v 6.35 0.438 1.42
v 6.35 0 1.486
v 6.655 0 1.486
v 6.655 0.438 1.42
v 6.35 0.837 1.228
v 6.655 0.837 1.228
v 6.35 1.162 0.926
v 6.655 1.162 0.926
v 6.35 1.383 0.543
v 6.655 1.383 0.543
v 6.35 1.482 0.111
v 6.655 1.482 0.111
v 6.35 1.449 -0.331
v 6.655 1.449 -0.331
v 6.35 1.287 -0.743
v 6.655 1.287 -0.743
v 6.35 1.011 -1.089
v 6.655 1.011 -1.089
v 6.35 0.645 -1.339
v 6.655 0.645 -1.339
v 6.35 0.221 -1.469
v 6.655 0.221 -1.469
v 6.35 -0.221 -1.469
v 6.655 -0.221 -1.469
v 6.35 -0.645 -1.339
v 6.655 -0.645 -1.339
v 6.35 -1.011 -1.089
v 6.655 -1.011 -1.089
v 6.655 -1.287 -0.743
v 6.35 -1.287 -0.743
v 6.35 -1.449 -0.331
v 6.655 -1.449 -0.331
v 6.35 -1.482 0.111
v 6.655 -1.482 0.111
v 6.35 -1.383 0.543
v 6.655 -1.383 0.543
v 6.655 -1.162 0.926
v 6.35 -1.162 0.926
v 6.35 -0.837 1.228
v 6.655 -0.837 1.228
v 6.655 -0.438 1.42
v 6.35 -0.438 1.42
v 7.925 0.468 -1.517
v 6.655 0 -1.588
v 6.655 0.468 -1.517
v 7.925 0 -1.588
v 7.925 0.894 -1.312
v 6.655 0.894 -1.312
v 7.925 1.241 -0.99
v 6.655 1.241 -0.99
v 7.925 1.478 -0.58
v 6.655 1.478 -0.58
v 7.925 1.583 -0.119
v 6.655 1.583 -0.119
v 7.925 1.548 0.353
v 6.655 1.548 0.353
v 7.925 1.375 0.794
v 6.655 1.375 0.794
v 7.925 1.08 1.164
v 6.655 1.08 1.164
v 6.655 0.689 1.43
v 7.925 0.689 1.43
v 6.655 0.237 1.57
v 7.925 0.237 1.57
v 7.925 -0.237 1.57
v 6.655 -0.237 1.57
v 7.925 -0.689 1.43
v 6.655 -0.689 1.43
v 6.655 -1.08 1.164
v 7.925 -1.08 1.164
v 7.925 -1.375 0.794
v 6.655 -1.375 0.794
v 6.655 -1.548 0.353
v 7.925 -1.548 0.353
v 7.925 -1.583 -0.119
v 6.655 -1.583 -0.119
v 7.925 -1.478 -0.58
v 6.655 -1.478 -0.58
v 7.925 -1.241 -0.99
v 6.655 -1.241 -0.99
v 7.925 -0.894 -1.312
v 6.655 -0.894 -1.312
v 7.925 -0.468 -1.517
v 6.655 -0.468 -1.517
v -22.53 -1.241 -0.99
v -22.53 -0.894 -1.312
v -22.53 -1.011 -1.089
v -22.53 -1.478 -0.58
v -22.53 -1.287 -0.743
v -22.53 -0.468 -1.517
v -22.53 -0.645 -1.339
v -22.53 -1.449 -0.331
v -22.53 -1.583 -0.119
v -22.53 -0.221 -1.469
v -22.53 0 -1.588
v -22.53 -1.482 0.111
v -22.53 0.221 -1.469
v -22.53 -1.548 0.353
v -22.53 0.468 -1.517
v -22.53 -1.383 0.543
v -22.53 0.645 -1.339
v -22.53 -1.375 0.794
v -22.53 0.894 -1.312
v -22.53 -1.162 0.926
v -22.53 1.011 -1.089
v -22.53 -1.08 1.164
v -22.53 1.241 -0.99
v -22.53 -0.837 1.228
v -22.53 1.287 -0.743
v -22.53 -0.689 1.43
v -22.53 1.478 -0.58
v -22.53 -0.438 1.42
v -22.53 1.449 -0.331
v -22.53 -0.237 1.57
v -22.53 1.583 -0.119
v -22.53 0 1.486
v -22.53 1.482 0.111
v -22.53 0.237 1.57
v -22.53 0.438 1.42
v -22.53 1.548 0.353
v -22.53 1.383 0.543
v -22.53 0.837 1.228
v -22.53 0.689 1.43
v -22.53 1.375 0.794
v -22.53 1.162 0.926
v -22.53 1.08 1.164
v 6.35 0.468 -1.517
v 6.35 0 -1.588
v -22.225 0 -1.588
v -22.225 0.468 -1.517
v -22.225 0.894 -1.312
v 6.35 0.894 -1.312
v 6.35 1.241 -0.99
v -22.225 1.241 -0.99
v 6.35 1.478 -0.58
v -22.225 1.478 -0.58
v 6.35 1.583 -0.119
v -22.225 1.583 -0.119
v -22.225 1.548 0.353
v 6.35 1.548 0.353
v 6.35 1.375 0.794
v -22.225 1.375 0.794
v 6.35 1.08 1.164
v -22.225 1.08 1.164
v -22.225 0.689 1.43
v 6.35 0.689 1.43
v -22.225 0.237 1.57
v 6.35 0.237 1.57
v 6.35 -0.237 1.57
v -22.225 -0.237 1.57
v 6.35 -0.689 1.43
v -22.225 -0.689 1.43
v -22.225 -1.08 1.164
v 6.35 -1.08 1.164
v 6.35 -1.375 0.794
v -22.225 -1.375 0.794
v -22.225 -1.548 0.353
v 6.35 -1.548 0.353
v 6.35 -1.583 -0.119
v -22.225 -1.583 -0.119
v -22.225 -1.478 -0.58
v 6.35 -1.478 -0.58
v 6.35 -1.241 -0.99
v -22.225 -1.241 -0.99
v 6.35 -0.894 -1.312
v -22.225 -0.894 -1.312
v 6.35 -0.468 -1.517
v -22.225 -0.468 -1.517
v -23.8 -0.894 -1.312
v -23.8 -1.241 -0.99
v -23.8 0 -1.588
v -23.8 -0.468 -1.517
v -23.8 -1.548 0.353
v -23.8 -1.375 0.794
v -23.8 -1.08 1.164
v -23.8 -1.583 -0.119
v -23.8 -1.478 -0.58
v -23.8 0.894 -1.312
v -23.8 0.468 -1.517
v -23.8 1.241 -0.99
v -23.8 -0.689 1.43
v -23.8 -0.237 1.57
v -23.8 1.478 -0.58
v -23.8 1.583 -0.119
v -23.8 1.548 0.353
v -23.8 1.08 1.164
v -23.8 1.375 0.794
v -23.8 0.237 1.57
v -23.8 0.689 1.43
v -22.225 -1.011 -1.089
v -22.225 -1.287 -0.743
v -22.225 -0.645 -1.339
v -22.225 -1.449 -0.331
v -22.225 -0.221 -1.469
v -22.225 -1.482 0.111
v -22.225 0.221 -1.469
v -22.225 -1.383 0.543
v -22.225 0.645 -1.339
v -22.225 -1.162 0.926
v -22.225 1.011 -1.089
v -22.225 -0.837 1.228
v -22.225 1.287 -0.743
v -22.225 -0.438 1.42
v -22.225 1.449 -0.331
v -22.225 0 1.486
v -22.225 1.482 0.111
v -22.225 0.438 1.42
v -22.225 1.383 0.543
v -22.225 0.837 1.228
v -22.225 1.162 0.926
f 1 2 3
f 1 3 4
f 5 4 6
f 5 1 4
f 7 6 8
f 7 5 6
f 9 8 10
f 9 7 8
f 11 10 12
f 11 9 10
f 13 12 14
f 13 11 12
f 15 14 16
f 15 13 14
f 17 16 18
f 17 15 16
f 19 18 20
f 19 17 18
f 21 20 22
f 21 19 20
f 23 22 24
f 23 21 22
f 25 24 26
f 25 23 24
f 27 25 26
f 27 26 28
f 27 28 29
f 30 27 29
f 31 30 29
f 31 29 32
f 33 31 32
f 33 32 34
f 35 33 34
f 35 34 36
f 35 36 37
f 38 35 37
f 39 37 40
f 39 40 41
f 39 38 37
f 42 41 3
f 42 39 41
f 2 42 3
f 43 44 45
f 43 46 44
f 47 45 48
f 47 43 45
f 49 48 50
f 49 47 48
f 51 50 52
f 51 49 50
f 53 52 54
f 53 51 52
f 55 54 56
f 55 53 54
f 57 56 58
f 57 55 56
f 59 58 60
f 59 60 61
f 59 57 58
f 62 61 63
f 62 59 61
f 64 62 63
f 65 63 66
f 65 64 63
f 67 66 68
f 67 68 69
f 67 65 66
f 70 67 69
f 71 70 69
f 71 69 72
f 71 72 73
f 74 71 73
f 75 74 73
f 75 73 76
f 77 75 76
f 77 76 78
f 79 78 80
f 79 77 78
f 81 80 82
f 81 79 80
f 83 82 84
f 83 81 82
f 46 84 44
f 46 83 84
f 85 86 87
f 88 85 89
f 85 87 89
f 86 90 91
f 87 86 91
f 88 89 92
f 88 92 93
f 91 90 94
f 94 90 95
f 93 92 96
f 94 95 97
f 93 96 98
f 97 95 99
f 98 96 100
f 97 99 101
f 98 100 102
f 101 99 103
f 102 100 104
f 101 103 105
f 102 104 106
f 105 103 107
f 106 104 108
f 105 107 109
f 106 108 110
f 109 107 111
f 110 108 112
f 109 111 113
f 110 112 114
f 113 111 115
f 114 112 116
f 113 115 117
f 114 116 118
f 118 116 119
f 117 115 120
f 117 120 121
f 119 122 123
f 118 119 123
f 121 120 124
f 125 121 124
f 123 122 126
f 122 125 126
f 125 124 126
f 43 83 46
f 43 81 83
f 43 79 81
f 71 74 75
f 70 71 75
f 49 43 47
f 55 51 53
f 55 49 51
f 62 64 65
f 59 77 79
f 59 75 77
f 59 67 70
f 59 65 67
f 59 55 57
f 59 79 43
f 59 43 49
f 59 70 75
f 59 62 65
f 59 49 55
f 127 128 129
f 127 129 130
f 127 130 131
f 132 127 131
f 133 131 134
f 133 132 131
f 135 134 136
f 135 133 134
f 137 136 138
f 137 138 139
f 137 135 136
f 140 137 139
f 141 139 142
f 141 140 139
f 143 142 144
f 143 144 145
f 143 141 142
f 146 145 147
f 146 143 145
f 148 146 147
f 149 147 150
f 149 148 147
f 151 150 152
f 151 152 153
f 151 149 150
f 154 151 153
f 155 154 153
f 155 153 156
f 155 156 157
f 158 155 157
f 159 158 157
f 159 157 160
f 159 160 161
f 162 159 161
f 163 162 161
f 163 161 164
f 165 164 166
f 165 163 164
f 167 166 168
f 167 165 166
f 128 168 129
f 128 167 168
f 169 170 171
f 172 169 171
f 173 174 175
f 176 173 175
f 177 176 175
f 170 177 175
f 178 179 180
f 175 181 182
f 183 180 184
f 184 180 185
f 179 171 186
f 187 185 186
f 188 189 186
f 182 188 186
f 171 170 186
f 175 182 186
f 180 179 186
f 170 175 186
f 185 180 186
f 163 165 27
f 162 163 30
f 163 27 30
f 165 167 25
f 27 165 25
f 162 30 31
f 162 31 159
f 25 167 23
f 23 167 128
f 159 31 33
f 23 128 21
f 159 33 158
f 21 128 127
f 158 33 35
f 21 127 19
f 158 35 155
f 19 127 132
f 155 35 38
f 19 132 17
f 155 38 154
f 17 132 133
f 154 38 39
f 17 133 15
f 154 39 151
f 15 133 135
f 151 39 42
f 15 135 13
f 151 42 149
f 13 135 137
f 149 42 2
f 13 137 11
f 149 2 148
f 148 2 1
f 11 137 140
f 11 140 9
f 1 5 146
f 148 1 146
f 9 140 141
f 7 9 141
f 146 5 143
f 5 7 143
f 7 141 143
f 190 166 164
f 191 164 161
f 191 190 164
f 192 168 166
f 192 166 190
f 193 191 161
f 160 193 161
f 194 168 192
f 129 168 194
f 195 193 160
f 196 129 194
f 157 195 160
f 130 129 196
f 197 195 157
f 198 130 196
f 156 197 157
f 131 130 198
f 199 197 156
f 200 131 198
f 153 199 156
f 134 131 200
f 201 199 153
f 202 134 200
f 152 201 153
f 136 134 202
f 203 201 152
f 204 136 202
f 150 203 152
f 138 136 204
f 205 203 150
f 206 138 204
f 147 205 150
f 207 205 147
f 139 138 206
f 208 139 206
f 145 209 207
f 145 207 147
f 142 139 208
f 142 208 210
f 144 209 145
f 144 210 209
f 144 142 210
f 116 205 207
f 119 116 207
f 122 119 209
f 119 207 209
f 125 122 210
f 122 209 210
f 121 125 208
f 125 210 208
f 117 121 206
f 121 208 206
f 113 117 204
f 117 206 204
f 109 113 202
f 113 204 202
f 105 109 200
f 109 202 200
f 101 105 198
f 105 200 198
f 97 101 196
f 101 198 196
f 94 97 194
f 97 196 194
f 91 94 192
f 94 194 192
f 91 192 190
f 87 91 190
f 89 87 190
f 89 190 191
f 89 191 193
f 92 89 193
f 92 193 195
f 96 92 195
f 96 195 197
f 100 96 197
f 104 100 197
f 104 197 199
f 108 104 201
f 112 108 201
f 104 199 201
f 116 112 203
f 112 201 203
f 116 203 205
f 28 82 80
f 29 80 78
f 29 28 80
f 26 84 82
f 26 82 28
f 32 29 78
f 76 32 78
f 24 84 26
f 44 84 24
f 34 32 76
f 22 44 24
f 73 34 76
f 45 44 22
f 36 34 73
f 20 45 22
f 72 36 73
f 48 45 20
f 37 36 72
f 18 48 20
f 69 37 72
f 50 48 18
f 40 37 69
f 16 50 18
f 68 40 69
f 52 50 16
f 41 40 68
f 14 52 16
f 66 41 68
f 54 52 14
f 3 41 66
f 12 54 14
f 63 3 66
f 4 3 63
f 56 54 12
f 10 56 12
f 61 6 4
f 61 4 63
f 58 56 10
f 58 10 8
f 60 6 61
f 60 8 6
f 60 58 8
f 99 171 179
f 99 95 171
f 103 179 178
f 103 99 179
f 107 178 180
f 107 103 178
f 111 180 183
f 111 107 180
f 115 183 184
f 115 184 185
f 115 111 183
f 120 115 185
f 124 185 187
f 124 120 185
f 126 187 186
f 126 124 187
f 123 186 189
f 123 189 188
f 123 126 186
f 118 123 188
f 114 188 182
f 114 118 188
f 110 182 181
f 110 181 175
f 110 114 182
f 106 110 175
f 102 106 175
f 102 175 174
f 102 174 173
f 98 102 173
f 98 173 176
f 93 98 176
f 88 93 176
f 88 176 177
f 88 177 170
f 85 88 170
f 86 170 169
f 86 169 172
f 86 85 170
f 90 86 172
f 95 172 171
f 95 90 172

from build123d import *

# Parameters (mm, degrees)
SKETCH2_R               = 1.5875
EXTRUDE1_DEPTH          = 25.4
EXTRUDE1_DEPTH_BACK     = 25.4
CHAMFER1_SIZE           = 0.3175
SKETCH3_OUTSIDE_W       = 15.376
SKETCH3_OUTSIDE_H       = 15.376
SKETCH3_OUTSIDE_R       = 1.4859
CUT_EXTRUDE1_DEPTH      = 0.3048
SKETCH4_OUTSIDE_W       = 15.376
SKETCH4_OUTSIDE_H       = 15.376
SKETCH4_OUTSIDE_R       = 1.4859
CUT_EXTRUDE2_DEPTH      = 0.3048
SKETCH5_W               = 17.4752
SKETCH5_H               = 6.35
SKETCH5_W_2             = 1.6002
CUT_EXTRUDE3_DEPTH      = 2.5875
CUT_EXTRUDE3_DEPTH_BACK = 2.5875


with BuildPart() as part:
    # Sketch2 → Extrude1 (new body, two sides)
    with BuildSketch(Plane(origin=(0, 0, 0), x_dir=(0, 0, -1), z_dir=(1, 0, 0))) as extrude1_sk:
        Circle(SKETCH2_R)
    extrude(amount=EXTRUDE1_DEPTH)
    extrude(extrude1_sk.sketch, amount=-EXTRUDE1_DEPTH_BACK)

    # Chamfer1
    chamfer1_edges = [part.edges().sort_by_distance(p)[0] for p in [
        (-25.4, 0, 1.5875),
        (25.4, 0, 1.5875),
    ]]
    chamfer(chamfer1_edges, length=CHAMFER1_SIZE)

    # Sketch3 outside → Cut-Extrude1 (cut)
    with BuildSketch(Plane.ZY.offset(22.225)):
        Rectangle(SKETCH3_OUTSIDE_W, SKETCH3_OUTSIDE_H)
        Circle(SKETCH3_OUTSIDE_R, mode=Mode.SUBTRACT)
    extrude(amount=CUT_EXTRUDE1_DEPTH, mode=Mode.SUBTRACT)

    # Sketch4 outside → Cut-Extrude2 (cut)
    with BuildSketch(Plane.ZY.offset(-6.35)):
        Rectangle(SKETCH4_OUTSIDE_W, SKETCH4_OUTSIDE_H)
        Circle(SKETCH4_OUTSIDE_R, mode=Mode.SUBTRACT)
    extrude(amount=-CUT_EXTRUDE2_DEPTH, mode=Mode.SUBTRACT)

    # Sketch5 → Cut-Extrude3 (cut, two sides)
    with BuildSketch(Plane.XY) as cut_extrude3_sk:
        with Locations((16.6624, 0)):
            Rectangle(SKETCH5_W, SKETCH5_H)
        with Locations((-24.5999, 0)):
            Rectangle(SKETCH5_W_2, SKETCH5_H)
    extrude(amount=CUT_EXTRUDE3_DEPTH, mode=Mode.SUBTRACT)
    extrude(cut_extrude3_sk.sketch, amount=-CUT_EXTRUDE3_DEPTH_BACK, mode=Mode.SUBTRACT)


solid = part.part
